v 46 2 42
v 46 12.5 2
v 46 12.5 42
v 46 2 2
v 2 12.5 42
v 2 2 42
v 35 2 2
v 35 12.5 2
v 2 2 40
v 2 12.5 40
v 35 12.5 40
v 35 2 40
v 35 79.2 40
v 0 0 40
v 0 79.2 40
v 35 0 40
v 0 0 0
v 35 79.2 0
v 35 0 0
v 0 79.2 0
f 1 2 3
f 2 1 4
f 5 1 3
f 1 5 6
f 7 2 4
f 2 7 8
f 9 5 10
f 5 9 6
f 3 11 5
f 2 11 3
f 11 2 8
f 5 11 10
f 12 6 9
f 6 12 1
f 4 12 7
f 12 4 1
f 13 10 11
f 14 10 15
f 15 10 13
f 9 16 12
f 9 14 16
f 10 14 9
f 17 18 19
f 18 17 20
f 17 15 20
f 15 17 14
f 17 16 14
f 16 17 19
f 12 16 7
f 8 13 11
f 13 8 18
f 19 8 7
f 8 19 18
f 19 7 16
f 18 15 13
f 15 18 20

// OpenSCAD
 //Dicke
 d=10.5;
 //Top width
 tw=36;
 //Bottom width
 bw=44;
 //Durchmesser Stopfen
 ds=4.8;
 //Height
 h=40;
 //Thickness
 t=2;
 //Breite Brett
 bb=35;
 //Tiefe Stopfen (Zentrum)
 ts=19.8;
 
 module webcam() {
     translate([t,t,t])
     color("#777777")
     cube([bw, d, h]);
 }
 
 webcam();
 
 //Halter linke Wand 
 cube([bw-tw, t , h]);
 
 
 //Brett
 module brett() {
     color("#AA6600")
     cube([bb, ts*4, h]);
 }
 
 brett();
